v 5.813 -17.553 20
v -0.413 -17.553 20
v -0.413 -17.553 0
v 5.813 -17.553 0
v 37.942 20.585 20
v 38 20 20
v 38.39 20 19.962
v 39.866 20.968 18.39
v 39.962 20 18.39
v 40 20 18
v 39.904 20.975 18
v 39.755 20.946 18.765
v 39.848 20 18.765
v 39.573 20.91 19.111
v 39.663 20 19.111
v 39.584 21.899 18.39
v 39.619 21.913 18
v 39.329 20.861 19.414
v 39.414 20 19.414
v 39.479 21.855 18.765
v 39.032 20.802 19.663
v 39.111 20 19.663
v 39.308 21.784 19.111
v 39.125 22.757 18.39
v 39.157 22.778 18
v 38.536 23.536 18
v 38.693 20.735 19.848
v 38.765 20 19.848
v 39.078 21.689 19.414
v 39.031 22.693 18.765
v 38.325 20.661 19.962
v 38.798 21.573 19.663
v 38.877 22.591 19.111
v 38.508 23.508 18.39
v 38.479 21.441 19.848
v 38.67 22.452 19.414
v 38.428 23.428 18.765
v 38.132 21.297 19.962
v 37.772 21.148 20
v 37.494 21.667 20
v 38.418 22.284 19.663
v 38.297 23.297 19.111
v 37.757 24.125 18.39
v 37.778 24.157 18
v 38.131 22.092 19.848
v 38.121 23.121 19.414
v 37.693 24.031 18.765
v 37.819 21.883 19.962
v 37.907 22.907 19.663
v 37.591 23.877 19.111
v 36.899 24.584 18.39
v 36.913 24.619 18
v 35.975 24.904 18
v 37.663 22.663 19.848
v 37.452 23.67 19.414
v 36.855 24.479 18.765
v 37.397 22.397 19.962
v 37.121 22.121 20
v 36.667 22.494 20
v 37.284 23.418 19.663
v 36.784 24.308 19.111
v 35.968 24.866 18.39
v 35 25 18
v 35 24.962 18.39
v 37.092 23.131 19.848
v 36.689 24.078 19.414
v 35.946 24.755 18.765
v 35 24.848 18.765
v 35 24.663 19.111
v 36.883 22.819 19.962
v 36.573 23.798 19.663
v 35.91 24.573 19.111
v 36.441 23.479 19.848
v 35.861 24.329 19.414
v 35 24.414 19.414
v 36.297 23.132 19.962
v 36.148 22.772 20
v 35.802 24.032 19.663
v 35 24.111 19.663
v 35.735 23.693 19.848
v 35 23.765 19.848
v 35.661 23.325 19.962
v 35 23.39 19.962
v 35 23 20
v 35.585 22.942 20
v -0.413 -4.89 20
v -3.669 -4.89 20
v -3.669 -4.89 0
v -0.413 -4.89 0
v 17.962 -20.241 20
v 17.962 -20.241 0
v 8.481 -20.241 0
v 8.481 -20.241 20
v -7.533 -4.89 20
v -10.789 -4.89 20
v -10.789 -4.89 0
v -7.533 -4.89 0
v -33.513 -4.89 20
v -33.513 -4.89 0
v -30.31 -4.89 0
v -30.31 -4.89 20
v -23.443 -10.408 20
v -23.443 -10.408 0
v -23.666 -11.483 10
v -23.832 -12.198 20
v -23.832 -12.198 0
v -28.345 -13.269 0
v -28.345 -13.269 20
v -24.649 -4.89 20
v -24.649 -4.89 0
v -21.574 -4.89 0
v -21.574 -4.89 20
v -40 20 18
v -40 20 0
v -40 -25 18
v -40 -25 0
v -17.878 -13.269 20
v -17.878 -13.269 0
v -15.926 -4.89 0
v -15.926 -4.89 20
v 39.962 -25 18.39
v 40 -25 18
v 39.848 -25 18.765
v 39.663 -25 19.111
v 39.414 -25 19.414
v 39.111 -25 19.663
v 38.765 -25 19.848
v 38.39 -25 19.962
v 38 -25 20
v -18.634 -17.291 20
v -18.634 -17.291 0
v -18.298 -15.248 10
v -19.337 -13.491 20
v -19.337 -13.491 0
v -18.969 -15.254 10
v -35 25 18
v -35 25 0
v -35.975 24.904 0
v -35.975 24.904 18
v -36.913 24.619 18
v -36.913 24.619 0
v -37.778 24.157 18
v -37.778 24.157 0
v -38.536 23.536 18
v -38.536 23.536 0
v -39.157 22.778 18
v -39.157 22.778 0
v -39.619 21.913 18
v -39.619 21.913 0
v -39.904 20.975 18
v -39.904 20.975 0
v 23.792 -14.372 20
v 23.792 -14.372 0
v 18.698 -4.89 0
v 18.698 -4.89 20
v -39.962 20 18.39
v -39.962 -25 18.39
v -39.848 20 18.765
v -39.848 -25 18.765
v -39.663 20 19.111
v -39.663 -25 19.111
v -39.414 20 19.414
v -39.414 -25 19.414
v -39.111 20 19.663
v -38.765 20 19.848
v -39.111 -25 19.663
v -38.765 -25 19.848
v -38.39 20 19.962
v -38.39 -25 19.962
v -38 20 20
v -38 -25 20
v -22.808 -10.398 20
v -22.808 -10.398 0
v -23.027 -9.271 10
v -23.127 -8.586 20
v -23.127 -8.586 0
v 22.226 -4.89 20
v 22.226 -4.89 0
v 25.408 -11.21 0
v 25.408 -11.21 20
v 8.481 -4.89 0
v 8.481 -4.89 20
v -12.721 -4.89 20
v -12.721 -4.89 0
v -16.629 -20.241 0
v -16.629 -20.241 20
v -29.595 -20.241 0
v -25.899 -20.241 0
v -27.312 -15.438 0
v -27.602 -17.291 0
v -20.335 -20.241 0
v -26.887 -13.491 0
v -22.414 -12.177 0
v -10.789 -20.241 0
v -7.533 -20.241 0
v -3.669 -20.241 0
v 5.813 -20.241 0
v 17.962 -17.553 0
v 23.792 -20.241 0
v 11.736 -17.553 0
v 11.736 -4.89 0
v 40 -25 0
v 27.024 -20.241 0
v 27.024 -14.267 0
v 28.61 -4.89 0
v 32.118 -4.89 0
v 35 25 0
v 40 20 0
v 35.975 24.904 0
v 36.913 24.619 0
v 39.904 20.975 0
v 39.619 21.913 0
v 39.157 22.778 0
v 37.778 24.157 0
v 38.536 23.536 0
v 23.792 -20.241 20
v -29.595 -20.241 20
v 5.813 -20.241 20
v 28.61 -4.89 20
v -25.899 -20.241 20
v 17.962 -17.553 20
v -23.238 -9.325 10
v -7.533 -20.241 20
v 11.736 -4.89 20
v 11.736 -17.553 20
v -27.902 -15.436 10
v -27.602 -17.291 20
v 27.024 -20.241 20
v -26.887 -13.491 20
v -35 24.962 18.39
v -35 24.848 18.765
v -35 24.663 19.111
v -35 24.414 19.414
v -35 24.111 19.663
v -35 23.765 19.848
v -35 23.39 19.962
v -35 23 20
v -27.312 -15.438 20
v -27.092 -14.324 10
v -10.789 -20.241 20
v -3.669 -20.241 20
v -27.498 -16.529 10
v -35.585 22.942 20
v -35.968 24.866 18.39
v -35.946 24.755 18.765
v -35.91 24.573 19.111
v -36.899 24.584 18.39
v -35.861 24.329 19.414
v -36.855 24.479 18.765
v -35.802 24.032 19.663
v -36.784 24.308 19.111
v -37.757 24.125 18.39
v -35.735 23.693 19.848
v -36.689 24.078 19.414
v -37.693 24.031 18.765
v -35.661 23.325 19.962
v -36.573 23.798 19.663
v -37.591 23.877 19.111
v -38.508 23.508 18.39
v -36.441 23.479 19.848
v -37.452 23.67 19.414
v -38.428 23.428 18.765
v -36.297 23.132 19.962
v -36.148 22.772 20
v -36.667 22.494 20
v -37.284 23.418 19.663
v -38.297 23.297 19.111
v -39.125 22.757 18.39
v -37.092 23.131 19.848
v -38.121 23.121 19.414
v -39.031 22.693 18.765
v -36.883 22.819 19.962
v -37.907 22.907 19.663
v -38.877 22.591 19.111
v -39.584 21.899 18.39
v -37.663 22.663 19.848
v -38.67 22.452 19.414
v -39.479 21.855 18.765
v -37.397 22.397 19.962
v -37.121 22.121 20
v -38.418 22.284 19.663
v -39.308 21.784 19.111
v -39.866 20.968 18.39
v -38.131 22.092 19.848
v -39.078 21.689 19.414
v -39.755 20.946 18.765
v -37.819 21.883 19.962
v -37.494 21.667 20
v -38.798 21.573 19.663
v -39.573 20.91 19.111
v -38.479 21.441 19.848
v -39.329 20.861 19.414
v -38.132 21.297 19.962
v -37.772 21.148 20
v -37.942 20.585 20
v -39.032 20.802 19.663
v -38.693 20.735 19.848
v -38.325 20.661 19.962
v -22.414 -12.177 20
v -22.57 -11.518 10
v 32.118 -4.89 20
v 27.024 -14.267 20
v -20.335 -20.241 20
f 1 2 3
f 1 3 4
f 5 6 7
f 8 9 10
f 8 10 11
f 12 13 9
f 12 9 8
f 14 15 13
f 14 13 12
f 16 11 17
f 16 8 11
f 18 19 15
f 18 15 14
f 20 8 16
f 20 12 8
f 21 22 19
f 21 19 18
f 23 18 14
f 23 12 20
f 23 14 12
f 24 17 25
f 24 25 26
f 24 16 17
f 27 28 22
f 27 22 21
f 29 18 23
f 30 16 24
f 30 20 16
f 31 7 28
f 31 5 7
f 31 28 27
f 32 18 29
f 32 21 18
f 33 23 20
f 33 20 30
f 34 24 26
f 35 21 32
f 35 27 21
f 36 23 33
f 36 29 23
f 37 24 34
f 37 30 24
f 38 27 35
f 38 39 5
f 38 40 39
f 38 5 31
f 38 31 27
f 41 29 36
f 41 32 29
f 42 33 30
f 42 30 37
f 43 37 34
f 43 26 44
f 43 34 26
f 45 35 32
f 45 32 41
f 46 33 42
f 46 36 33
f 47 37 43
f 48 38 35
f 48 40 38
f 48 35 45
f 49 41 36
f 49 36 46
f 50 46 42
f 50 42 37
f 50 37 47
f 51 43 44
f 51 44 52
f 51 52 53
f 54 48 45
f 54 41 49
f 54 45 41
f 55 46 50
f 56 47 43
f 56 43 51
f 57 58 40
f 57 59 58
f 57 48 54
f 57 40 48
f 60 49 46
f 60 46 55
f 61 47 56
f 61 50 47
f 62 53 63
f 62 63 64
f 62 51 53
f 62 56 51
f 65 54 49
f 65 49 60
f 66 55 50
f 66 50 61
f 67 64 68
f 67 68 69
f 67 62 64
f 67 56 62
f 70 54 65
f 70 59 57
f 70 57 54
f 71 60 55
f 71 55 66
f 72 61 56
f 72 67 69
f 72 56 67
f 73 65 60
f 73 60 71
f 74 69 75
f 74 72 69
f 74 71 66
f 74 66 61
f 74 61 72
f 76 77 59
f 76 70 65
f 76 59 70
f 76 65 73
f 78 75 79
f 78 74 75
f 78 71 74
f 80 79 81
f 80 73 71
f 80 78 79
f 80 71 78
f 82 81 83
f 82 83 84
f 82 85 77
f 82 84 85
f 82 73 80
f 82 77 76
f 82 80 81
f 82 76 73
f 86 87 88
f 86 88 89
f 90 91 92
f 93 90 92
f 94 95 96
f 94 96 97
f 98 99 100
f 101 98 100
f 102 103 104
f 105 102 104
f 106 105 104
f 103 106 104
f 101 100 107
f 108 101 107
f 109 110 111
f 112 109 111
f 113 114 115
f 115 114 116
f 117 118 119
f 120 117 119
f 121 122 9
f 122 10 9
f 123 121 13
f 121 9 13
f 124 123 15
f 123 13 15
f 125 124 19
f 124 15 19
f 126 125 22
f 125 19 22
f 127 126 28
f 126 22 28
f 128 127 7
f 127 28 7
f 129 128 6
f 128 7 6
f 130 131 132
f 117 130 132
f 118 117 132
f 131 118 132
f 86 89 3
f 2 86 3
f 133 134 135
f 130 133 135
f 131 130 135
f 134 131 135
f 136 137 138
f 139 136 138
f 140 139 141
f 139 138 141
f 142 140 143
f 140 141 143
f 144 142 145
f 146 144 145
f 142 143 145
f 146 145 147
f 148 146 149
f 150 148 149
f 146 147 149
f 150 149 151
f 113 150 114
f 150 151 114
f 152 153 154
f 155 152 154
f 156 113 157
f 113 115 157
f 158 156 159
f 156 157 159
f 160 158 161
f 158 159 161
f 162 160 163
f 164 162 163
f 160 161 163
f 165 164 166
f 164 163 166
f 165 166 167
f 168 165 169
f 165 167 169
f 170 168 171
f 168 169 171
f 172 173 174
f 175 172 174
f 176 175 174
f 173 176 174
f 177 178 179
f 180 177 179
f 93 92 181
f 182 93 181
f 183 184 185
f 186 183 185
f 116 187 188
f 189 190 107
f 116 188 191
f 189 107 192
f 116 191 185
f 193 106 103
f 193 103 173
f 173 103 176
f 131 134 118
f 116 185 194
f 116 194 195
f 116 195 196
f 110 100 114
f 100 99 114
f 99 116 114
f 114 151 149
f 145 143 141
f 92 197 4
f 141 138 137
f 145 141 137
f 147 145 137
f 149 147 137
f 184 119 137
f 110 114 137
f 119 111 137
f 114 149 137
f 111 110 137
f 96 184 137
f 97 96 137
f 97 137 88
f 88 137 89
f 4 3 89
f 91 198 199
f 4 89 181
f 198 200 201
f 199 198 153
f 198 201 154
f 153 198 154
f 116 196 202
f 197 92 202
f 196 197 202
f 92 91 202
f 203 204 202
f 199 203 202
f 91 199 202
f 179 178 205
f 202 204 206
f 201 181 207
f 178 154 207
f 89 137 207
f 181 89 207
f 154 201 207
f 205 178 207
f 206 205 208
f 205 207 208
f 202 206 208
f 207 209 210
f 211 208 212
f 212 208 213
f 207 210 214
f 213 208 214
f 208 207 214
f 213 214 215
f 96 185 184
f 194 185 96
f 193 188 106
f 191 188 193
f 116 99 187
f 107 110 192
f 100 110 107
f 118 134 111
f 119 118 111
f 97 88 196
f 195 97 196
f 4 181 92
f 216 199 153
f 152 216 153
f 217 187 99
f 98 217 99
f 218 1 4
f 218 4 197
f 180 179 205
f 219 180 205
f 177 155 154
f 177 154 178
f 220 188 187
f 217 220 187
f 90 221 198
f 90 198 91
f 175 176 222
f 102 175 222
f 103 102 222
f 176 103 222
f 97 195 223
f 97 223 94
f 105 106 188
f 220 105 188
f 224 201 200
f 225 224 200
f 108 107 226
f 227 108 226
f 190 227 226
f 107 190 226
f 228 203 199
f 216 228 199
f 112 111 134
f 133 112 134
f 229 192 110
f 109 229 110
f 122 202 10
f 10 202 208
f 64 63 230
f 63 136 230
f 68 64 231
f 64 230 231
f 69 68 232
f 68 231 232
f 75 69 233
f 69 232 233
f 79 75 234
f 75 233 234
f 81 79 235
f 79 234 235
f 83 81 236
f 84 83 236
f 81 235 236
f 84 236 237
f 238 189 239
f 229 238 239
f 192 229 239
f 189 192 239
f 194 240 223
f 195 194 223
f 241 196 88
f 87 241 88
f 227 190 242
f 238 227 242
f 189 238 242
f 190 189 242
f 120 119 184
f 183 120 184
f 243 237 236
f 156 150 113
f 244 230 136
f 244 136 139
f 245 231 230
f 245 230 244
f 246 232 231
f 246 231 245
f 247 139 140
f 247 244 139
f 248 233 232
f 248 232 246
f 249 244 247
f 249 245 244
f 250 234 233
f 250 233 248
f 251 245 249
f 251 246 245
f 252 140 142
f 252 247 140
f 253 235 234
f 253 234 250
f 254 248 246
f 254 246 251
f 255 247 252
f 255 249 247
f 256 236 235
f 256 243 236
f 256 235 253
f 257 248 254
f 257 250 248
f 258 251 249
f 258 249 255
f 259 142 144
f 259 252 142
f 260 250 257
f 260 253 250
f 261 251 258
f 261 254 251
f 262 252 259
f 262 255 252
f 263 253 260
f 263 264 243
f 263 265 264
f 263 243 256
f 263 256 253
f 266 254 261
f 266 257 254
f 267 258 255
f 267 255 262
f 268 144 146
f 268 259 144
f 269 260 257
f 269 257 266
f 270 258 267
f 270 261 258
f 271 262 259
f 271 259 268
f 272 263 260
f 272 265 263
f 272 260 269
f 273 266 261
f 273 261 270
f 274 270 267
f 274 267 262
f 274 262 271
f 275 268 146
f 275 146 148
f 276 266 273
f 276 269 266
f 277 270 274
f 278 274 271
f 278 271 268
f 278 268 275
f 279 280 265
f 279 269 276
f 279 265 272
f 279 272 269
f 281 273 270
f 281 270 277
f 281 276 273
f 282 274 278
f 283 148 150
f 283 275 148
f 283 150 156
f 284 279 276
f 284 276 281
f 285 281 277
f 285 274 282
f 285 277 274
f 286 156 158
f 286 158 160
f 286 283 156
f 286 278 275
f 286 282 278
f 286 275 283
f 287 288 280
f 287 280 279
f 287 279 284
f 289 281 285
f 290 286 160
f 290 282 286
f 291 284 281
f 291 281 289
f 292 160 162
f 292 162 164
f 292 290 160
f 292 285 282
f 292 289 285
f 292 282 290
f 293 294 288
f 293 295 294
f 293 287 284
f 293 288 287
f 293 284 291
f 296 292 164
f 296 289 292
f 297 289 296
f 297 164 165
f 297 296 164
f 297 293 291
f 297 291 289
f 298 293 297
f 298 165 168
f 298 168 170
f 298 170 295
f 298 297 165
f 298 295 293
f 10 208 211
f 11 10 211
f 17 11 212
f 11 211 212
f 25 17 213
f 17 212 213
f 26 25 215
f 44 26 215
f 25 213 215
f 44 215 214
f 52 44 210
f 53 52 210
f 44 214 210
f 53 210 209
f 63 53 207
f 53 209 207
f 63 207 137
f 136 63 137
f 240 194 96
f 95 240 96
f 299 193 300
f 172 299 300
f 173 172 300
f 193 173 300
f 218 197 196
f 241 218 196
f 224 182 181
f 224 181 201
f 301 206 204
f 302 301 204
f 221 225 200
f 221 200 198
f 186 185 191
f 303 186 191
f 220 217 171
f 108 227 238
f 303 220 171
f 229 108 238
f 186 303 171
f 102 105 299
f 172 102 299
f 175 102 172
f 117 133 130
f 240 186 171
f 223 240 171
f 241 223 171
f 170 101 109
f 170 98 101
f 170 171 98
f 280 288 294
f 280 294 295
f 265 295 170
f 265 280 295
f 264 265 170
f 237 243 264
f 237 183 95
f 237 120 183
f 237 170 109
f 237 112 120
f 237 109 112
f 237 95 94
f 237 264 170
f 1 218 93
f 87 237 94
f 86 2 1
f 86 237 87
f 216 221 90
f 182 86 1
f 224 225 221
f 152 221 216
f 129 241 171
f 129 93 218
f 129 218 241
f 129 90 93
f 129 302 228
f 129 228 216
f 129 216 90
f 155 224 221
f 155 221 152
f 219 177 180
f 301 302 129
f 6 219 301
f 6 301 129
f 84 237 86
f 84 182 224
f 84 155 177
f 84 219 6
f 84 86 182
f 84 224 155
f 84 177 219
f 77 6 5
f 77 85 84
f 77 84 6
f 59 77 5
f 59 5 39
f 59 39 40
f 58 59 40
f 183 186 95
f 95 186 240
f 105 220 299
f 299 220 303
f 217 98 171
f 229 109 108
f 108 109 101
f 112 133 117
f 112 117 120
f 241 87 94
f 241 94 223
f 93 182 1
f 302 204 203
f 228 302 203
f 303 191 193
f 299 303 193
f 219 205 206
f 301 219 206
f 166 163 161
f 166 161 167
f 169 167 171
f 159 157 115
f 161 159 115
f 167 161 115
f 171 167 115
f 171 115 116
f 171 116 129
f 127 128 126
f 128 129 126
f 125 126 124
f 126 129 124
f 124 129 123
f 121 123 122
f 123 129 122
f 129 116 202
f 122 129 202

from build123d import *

# Parameters (mm, degrees)
F0_W     = 3.2558272286
F0_H     = 15.3517797806
F1_DEPTH = 20
F2_R     = 2


with BuildPart() as f1:
    # F0 (on Top) → F1 (new body)
    with BuildSketch(Plane.XY):
        with BuildLine():
            Line((-40, -25), (40, -25))
            Line((40, -25), (40, 20))
            ThreePointArc((40, 20), (38.5355339059, 23.5355339059), (35, 25))
            Line((35, 25), (-35, 25))
            ThreePointArc((-35, 25), (-38.5355339059, 23.5355339059), (-40, 20))
            Line((-40, 20), (-40, -25))
        make_face()
        with BuildLine():
            Line((-12.7209101006, -4.8896298527), (-16.6285747722, -20.2414096333))
            Line((-16.6285747722, -20.2414096333), (-20.3346402347, -20.2414096333))
            Line((-20.3346402347, -20.2414096333), (-22.4144720763, -12.1774412653))
            add(Edge.make_bspline(
                [(-22.4144720763, -12.1774412653), (-22.5287116282, -11.7473629523), (-22.8075905342, -10.3983282441)],
                knots=[0, 0, 0, 1, 1, 1], degree=2))
            add(Edge.make_bspline(
                [(-22.8075905342, -10.3983282441), (-23.0864694403, -9.0492935358), (-23.1267892821, -8.5856153547)],
                knots=[0, 0, 0, 1, 1, 1], degree=2))
            add(Edge.make_bspline(
                [(-23.1267892821, -8.5856153547), (-23.1906290317, -9.1534531273), (-23.4426280432, -10.4084082045)],
                knots=[0, 0, 0, 1, 1, 1], degree=2))
            add(Edge.make_bspline(
                [(-23.4426280432, -10.4084082045), (-23.6946270547, -11.6633632818), (-23.8323865143, -12.1976011862)],
                knots=[0, 0, 0, 1, 1, 1], degree=2))
            Line((-23.8323865143, -12.1976011862), (-25.8987784087, -20.2414096333))
            Line((-25.8987784087, -20.2414096333), (-29.5947639107, -20.2414096333))
            Line((-29.5947639107, -20.2414096333), (-33.5125085428, -4.8896298527))
            Line((-33.5125085428, -4.8896298527), (-30.3104411033, -4.8896298527))
            Line((-30.3104411033, -4.8896298527), (-28.3448488136, -13.2694369818))
            add(Edge.make_bspline(
                [(-28.3448488136, -13.2694369818), (-27.8307708302, -15.5911878744), (-27.6022917264, -17.2913412053)],
                knots=[0, 0, 0, 1, 1, 1], degree=2))
            add(Edge.make_bspline(
                [(-27.6022917264, -17.2913412053), (-27.5384519768, -16.6932635514), (-27.3116528665, -15.4383084741)],
                knots=[0, 0, 0, 1, 1, 1], degree=2))
            add(Edge.make_bspline(
                [(-27.3116528665, -15.4383084741), (-27.0848537561, -14.1833533968), (-26.8866145337, -13.4911961119)],
                knots=[0, 0, 0, 1, 1, 1], degree=2))
            Line((-26.8866145337, -13.4911961119), (-24.6488633116, -4.8896298527))
            Line((-24.6488633116, -4.8896298527), (-21.5744753713, -4.8896298527))
            Line((-21.5744753713, -4.8896298527), (-19.3367241492, -13.4911961119))
            add(Edge.make_bspline(
                [(-19.3367241492, -13.4911961119), (-19.1888847291, -14.0657538581), (-18.9688055924, -15.253509199)],
                knots=[0, 0, 0, 1, 1, 1], degree=2))
            add(Edge.make_bspline(
                [(-18.9688055924, -15.253509199), (-18.7487264557, -16.4412645399), (-18.6344869038, -17.2913412053)],
                knots=[0, 0, 0, 1, 1, 1], degree=2))
            add(Edge.make_bspline(
                [(-18.6344869038, -17.2913412053), (-18.5303273124, -16.4715044213), (-18.2984882218, -15.2484692188)],
                knots=[0, 0, 0, 1, 1, 1], degree=2))
            add(Edge.make_bspline(
                [(-18.2984882218, -15.2484692188), (-18.0666491312, -14.0254340163), (-17.8784898693, -13.2694369818)],
                knots=[0, 0, 0, 1, 1, 1], degree=2))
            Line((-17.8784898693, -13.2694369818), (-15.9263375269, -4.8896298527))
            Line((-15.9263375269, -4.8896298527), (-12.7209101006, -4.8896298527))
        make_face(mode=Mode.SUBTRACT)
        with Locations((-9.1610040648, -12.565519743)):
            Rectangle(F0_W, F0_H, mode=Mode.SUBTRACT)
        Polygon((5.8127771986, -20.2414096333), (-3.6691056075, -20.2414096333), (-3.6691056075, -4.8896298527), (-0.4132783789, -4.8896298527), (-0.4132783789, -17.5534201773), (5.8127771986, -17.5534201773), align=None, mode=Mode.SUBTRACT)
        Polygon((17.9624895398, -20.2414096333), (8.4806067337, -20.2414096333), (8.4806067337, -4.8896298527), (11.7364339623, -4.8896298527), (11.7364339623, -17.5534201773), (17.9624895398, -17.5534201773), align=None, mode=Mode.SUBTRACT)
        Polygon((22.2263128144, -4.8896298527), (25.4082203329, -11.2097650611), (28.6102877724, -4.8896298527), (32.1181140125, -4.8896298527), (27.0243739934, -14.2673530673), (27.0243739934, -20.2414096333), (23.7920666725, -20.2414096333), (23.7920666725, -14.3715126587), (18.6983266534, -4.8896298527), align=None, mode=Mode.SUBTRACT)
    extrude(amount=F1_DEPTH)

    # F2
    f2_edges = [f1.edges().sort_by_distance(p)[0] for p in [
        (-40, -2.5, 20),
    ]]
    fillet(f2_edges, radius=F2_R)


solid = f1.part
